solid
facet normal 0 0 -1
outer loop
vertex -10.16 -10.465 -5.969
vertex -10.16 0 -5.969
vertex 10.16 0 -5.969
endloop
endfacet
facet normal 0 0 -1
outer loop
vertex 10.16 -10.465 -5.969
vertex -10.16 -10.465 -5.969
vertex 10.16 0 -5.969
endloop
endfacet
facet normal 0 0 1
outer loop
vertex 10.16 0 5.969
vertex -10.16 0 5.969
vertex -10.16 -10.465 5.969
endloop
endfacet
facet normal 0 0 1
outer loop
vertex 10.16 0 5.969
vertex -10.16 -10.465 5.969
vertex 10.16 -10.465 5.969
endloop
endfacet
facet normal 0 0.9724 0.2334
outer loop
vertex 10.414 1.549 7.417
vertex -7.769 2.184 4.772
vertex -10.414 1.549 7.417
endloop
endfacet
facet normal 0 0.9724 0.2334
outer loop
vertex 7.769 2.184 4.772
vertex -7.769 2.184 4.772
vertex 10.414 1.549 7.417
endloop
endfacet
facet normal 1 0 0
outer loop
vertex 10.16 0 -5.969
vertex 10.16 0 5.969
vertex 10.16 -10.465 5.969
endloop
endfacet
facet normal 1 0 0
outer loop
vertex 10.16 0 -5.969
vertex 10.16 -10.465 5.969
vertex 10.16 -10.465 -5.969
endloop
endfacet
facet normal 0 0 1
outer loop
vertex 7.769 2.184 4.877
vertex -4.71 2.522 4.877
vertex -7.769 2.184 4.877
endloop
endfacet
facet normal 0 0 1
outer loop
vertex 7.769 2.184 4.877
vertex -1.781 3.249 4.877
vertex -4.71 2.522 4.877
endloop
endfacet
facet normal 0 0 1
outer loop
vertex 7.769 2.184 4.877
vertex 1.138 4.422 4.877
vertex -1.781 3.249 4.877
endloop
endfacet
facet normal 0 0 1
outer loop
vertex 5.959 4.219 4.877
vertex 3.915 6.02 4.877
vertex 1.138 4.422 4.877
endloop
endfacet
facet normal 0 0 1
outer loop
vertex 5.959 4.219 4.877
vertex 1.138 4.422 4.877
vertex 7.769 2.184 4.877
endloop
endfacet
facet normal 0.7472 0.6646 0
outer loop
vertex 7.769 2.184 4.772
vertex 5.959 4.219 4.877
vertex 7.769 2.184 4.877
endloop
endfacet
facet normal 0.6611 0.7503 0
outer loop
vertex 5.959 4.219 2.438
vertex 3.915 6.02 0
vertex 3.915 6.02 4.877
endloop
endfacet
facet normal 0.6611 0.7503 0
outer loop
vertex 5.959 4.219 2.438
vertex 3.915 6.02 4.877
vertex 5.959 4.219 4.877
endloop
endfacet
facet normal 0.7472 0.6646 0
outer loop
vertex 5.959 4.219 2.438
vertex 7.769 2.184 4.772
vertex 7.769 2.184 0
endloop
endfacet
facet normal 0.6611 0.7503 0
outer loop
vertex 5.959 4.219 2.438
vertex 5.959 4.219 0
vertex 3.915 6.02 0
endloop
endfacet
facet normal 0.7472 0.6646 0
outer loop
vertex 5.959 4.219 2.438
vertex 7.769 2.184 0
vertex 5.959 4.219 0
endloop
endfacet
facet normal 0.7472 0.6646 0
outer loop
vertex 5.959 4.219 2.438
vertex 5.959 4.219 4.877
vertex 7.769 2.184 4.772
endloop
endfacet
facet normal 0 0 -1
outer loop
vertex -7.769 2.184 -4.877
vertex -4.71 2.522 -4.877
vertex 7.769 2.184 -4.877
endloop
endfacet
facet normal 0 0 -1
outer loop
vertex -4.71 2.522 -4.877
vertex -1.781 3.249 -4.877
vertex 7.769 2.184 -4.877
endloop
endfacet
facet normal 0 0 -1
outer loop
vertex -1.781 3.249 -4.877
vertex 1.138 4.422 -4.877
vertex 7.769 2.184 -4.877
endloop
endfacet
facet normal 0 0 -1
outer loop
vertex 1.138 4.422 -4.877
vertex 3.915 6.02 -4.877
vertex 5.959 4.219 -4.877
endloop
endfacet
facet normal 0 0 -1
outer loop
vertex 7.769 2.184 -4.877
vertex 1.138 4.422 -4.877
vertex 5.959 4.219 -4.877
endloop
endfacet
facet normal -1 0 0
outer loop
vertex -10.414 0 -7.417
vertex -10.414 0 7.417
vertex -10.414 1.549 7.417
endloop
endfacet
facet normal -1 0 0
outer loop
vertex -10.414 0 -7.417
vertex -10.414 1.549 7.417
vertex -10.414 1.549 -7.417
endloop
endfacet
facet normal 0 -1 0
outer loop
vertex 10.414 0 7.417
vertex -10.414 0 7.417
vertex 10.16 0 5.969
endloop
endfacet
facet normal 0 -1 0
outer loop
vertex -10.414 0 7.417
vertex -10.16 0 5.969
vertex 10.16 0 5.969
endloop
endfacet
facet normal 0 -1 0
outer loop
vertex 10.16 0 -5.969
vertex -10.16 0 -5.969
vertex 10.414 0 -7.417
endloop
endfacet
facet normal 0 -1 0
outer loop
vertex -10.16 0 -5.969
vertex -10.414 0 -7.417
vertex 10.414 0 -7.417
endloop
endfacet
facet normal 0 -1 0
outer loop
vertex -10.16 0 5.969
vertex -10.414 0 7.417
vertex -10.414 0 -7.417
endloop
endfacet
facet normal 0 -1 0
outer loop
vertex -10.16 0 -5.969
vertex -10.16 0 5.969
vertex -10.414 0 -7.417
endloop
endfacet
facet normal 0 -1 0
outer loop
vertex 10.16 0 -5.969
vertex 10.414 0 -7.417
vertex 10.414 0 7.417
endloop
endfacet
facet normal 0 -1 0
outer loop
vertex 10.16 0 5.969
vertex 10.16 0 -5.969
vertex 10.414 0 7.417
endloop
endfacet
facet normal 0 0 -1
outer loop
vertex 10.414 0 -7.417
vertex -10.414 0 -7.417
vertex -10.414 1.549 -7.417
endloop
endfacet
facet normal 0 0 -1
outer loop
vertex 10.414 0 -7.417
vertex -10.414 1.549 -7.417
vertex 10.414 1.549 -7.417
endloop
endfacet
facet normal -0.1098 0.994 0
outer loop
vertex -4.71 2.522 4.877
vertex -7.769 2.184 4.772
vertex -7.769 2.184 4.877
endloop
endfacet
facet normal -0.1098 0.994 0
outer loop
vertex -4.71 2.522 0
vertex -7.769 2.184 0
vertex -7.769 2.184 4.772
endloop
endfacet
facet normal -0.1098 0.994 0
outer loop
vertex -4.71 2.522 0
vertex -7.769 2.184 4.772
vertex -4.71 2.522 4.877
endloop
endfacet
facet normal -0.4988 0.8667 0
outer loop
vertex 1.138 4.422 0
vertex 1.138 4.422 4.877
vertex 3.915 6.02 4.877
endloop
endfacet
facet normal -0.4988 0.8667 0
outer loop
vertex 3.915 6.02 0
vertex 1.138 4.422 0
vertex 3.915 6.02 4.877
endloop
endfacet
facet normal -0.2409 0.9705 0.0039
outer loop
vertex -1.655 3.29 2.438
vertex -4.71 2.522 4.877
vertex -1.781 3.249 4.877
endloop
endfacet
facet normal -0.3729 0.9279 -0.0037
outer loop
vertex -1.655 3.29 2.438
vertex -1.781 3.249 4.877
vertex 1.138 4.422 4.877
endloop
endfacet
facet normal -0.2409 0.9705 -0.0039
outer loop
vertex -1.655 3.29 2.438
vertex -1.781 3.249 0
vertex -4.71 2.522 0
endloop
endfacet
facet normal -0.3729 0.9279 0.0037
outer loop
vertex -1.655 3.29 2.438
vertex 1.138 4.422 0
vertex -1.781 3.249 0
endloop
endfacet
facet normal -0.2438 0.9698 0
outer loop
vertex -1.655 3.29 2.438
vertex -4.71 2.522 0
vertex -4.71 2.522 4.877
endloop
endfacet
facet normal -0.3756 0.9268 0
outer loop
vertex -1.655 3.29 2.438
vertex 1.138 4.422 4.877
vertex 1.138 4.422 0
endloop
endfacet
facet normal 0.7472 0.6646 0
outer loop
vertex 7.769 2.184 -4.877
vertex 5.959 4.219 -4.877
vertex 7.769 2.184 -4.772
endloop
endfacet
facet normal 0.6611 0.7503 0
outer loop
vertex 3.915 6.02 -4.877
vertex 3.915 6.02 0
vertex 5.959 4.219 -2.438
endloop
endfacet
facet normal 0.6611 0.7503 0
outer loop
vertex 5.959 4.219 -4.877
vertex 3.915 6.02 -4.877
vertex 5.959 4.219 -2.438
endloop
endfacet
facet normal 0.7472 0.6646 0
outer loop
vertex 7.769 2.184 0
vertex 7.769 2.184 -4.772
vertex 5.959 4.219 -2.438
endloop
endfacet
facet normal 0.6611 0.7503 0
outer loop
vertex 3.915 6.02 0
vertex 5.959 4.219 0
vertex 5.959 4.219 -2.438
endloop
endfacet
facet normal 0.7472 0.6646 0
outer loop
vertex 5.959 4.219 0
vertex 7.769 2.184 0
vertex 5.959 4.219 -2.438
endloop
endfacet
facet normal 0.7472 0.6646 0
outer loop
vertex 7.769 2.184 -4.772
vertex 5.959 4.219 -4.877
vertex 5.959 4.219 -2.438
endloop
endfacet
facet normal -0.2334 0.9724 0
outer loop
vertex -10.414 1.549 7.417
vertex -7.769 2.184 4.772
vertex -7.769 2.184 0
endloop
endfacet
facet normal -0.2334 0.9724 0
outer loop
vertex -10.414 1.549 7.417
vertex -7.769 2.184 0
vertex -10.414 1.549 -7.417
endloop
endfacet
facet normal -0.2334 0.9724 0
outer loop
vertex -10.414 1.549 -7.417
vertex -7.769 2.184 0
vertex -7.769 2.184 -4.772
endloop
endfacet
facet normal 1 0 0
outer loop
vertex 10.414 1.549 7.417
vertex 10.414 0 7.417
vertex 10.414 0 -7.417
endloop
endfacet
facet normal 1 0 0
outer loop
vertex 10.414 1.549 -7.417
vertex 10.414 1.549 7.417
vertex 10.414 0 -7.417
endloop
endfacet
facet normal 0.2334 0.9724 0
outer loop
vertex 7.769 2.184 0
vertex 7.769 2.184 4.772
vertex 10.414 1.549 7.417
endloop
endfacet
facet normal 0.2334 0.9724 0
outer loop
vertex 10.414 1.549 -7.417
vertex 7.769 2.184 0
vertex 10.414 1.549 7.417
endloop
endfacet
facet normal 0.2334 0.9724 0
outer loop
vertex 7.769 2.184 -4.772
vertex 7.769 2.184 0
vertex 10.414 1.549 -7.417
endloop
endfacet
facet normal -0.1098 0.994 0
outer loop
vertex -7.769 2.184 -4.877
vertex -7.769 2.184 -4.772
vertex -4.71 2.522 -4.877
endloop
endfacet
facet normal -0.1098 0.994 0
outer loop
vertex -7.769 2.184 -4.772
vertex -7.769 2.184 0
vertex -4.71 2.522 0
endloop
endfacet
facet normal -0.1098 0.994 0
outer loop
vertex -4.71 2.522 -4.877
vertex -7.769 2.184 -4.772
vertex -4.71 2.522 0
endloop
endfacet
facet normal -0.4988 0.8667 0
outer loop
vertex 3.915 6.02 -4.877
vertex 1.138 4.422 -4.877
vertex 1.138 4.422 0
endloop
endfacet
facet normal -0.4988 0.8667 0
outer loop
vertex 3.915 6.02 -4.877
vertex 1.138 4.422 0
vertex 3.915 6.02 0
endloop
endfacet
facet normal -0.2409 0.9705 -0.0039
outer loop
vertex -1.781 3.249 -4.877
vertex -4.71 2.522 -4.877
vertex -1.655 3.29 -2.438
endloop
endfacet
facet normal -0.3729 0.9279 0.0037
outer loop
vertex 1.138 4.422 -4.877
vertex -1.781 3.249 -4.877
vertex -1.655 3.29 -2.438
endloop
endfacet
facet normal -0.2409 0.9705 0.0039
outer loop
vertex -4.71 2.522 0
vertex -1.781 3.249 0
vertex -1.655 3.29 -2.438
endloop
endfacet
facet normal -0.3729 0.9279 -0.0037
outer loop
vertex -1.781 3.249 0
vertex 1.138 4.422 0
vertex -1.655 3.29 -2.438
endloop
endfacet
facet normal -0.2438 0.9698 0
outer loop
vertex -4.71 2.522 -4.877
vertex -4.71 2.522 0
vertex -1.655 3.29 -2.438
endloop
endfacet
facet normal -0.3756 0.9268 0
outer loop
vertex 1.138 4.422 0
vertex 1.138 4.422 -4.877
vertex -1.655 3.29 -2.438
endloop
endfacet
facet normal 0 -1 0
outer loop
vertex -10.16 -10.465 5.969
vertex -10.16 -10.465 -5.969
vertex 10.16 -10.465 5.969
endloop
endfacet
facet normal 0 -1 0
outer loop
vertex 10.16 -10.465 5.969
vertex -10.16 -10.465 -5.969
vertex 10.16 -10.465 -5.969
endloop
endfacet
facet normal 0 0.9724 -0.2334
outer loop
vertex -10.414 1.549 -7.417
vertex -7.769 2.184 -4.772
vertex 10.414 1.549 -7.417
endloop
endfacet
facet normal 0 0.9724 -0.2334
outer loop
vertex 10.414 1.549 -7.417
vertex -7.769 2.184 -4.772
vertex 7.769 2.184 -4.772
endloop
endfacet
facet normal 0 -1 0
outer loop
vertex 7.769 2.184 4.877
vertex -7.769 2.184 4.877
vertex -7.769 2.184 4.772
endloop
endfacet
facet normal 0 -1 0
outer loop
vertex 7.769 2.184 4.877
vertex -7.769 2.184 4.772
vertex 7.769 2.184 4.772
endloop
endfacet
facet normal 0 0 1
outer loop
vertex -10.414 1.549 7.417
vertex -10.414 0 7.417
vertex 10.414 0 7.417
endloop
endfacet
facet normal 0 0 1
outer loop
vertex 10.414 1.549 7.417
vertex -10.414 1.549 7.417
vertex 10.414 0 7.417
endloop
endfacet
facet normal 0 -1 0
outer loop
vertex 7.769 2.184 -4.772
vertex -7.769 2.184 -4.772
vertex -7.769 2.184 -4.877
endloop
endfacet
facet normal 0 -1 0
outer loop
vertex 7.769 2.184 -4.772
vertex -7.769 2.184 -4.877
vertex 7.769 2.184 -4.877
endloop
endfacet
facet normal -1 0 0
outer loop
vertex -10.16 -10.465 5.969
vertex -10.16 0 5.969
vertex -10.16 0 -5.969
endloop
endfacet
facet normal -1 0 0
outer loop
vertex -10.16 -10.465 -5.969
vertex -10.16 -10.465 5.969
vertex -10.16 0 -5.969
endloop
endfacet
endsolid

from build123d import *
from OCP.BRepFilletAPI import BRepFilletAPI_MakeChamfer

# Parameters (mm, degrees)
SKETCH1_W           = 20.32
SKETCH1_H           = 11.938
BOSS_EXTRUDE1_DEPTH = 10.4648
SKETCH2_W           = 20.828
SKETCH2_H           = 14.8336
BOSS_EXTRUDE2_DEPTH = 2.1844
CHAMFER1_SIZE       = 0.635
CHAMFER1_SIZE2      = 2.644965354
BOSS_EXTRUDE3_DEPTH = 4.8768


with BuildPart() as part:
    # Sketch1 → Boss-Extrude1 (new body)
    with BuildSketch(Plane(origin=(0, 0, 0), x_dir=(1, 0, 0), z_dir=(0, 1, 0))):
        Rectangle(SKETCH1_W, SKETCH1_H)
    extrude(amount=-BOSS_EXTRUDE1_DEPTH)

    # Sketch2 → Boss-Extrude2 (add)
    with BuildSketch(Plane(origin=(0, 0, 0), x_dir=(1, 0, 0), z_dir=(0, 1, 0))):
        Rectangle(SKETCH2_W, SKETCH2_H)
    extrude(amount=BOSS_EXTRUDE2_DEPTH)

    # Chamfer1: one chamfer whose edges measure the first distance from different faces: ONE call of the kernel's chamfer builder (chamfer() names one face for all edges)
    chamfer1_edges_1 = [part.edges().sort_by_distance(p)[0] for p in [
        (10.414, 2.1844, 0),
    ]]
    chamfer1_side_1 = [part.faces().sort_by_distance(p)[0] for p in [
        (10.414, 1.0922, 0),
    ]]
    chamfer1_edges_2 = [part.edges().sort_by_distance(p)[0] for p in [
        (0, 2.1844, -7.4168),
    ]]
    chamfer1_side_2 = [part.faces().sort_by_distance(p)[0] for p in [
        (0, 1.0922, -7.4168),
    ]]
    chamfer1_edges_3 = [part.edges().sort_by_distance(p)[0] for p in [
        (-10.414, 2.1844, 0),
    ]]
    chamfer1_side_3 = [part.faces().sort_by_distance(p)[0] for p in [
        (-10.414, 1.0922, 0),
    ]]
    chamfer1_edges_4 = [part.edges().sort_by_distance(p)[0] for p in [
        (0, 2.1844, 7.4168),
    ]]
    chamfer1_side_4 = [part.faces().sort_by_distance(p)[0] for p in [
        (0, 1.0922, 7.4168),
    ]]
    chamfer1 = BRepFilletAPI_MakeChamfer(part.part.solid().wrapped)
    for e in chamfer1_edges_1:
        chamfer1.Add(CHAMFER1_SIZE, CHAMFER1_SIZE2, e.wrapped, chamfer1_side_1[0].wrapped)  # the first distance lies on this face
    for e in chamfer1_edges_2:
        chamfer1.Add(CHAMFER1_SIZE, CHAMFER1_SIZE2, e.wrapped, chamfer1_side_2[0].wrapped)  # the first distance lies on this face
    for e in chamfer1_edges_3:
        chamfer1.Add(CHAMFER1_SIZE, CHAMFER1_SIZE2, e.wrapped, chamfer1_side_3[0].wrapped)  # the first distance lies on this face
    for e in chamfer1_edges_4:
        chamfer1.Add(CHAMFER1_SIZE, CHAMFER1_SIZE2, e.wrapped, chamfer1_side_4[0].wrapped)  # the first distance lies on this face
    add(Compound.cast(chamfer1.Shape()), mode=Mode.REPLACE)

    # Sketch11 → Boss-Extrude3 (add, symmetric)
    with BuildSketch(Plane.XY):
        with BuildLine():
            Line((-7.769034646, 2.1844), (7.769034646, 2.1844))
            add(Edge.make_bspline(
                [(3.914965354, 6.0198), (6.076533794, 4.336461904), (7.769034646, 2.1844)],
                knots=[0, 0, 0, 1, 1, 1], degree=2))
            add(Edge.make_bspline(
                [(-7.769034646, 2.1844), (-1.382026132, 2.477514442), (3.914965354, 6.0198)],
                knots=[0, 0, 0, 1, 1, 1], degree=2))
        make_face()
    extrude(amount=BOSS_EXTRUDE3_DEPTH, both=True)


solid = part.part
